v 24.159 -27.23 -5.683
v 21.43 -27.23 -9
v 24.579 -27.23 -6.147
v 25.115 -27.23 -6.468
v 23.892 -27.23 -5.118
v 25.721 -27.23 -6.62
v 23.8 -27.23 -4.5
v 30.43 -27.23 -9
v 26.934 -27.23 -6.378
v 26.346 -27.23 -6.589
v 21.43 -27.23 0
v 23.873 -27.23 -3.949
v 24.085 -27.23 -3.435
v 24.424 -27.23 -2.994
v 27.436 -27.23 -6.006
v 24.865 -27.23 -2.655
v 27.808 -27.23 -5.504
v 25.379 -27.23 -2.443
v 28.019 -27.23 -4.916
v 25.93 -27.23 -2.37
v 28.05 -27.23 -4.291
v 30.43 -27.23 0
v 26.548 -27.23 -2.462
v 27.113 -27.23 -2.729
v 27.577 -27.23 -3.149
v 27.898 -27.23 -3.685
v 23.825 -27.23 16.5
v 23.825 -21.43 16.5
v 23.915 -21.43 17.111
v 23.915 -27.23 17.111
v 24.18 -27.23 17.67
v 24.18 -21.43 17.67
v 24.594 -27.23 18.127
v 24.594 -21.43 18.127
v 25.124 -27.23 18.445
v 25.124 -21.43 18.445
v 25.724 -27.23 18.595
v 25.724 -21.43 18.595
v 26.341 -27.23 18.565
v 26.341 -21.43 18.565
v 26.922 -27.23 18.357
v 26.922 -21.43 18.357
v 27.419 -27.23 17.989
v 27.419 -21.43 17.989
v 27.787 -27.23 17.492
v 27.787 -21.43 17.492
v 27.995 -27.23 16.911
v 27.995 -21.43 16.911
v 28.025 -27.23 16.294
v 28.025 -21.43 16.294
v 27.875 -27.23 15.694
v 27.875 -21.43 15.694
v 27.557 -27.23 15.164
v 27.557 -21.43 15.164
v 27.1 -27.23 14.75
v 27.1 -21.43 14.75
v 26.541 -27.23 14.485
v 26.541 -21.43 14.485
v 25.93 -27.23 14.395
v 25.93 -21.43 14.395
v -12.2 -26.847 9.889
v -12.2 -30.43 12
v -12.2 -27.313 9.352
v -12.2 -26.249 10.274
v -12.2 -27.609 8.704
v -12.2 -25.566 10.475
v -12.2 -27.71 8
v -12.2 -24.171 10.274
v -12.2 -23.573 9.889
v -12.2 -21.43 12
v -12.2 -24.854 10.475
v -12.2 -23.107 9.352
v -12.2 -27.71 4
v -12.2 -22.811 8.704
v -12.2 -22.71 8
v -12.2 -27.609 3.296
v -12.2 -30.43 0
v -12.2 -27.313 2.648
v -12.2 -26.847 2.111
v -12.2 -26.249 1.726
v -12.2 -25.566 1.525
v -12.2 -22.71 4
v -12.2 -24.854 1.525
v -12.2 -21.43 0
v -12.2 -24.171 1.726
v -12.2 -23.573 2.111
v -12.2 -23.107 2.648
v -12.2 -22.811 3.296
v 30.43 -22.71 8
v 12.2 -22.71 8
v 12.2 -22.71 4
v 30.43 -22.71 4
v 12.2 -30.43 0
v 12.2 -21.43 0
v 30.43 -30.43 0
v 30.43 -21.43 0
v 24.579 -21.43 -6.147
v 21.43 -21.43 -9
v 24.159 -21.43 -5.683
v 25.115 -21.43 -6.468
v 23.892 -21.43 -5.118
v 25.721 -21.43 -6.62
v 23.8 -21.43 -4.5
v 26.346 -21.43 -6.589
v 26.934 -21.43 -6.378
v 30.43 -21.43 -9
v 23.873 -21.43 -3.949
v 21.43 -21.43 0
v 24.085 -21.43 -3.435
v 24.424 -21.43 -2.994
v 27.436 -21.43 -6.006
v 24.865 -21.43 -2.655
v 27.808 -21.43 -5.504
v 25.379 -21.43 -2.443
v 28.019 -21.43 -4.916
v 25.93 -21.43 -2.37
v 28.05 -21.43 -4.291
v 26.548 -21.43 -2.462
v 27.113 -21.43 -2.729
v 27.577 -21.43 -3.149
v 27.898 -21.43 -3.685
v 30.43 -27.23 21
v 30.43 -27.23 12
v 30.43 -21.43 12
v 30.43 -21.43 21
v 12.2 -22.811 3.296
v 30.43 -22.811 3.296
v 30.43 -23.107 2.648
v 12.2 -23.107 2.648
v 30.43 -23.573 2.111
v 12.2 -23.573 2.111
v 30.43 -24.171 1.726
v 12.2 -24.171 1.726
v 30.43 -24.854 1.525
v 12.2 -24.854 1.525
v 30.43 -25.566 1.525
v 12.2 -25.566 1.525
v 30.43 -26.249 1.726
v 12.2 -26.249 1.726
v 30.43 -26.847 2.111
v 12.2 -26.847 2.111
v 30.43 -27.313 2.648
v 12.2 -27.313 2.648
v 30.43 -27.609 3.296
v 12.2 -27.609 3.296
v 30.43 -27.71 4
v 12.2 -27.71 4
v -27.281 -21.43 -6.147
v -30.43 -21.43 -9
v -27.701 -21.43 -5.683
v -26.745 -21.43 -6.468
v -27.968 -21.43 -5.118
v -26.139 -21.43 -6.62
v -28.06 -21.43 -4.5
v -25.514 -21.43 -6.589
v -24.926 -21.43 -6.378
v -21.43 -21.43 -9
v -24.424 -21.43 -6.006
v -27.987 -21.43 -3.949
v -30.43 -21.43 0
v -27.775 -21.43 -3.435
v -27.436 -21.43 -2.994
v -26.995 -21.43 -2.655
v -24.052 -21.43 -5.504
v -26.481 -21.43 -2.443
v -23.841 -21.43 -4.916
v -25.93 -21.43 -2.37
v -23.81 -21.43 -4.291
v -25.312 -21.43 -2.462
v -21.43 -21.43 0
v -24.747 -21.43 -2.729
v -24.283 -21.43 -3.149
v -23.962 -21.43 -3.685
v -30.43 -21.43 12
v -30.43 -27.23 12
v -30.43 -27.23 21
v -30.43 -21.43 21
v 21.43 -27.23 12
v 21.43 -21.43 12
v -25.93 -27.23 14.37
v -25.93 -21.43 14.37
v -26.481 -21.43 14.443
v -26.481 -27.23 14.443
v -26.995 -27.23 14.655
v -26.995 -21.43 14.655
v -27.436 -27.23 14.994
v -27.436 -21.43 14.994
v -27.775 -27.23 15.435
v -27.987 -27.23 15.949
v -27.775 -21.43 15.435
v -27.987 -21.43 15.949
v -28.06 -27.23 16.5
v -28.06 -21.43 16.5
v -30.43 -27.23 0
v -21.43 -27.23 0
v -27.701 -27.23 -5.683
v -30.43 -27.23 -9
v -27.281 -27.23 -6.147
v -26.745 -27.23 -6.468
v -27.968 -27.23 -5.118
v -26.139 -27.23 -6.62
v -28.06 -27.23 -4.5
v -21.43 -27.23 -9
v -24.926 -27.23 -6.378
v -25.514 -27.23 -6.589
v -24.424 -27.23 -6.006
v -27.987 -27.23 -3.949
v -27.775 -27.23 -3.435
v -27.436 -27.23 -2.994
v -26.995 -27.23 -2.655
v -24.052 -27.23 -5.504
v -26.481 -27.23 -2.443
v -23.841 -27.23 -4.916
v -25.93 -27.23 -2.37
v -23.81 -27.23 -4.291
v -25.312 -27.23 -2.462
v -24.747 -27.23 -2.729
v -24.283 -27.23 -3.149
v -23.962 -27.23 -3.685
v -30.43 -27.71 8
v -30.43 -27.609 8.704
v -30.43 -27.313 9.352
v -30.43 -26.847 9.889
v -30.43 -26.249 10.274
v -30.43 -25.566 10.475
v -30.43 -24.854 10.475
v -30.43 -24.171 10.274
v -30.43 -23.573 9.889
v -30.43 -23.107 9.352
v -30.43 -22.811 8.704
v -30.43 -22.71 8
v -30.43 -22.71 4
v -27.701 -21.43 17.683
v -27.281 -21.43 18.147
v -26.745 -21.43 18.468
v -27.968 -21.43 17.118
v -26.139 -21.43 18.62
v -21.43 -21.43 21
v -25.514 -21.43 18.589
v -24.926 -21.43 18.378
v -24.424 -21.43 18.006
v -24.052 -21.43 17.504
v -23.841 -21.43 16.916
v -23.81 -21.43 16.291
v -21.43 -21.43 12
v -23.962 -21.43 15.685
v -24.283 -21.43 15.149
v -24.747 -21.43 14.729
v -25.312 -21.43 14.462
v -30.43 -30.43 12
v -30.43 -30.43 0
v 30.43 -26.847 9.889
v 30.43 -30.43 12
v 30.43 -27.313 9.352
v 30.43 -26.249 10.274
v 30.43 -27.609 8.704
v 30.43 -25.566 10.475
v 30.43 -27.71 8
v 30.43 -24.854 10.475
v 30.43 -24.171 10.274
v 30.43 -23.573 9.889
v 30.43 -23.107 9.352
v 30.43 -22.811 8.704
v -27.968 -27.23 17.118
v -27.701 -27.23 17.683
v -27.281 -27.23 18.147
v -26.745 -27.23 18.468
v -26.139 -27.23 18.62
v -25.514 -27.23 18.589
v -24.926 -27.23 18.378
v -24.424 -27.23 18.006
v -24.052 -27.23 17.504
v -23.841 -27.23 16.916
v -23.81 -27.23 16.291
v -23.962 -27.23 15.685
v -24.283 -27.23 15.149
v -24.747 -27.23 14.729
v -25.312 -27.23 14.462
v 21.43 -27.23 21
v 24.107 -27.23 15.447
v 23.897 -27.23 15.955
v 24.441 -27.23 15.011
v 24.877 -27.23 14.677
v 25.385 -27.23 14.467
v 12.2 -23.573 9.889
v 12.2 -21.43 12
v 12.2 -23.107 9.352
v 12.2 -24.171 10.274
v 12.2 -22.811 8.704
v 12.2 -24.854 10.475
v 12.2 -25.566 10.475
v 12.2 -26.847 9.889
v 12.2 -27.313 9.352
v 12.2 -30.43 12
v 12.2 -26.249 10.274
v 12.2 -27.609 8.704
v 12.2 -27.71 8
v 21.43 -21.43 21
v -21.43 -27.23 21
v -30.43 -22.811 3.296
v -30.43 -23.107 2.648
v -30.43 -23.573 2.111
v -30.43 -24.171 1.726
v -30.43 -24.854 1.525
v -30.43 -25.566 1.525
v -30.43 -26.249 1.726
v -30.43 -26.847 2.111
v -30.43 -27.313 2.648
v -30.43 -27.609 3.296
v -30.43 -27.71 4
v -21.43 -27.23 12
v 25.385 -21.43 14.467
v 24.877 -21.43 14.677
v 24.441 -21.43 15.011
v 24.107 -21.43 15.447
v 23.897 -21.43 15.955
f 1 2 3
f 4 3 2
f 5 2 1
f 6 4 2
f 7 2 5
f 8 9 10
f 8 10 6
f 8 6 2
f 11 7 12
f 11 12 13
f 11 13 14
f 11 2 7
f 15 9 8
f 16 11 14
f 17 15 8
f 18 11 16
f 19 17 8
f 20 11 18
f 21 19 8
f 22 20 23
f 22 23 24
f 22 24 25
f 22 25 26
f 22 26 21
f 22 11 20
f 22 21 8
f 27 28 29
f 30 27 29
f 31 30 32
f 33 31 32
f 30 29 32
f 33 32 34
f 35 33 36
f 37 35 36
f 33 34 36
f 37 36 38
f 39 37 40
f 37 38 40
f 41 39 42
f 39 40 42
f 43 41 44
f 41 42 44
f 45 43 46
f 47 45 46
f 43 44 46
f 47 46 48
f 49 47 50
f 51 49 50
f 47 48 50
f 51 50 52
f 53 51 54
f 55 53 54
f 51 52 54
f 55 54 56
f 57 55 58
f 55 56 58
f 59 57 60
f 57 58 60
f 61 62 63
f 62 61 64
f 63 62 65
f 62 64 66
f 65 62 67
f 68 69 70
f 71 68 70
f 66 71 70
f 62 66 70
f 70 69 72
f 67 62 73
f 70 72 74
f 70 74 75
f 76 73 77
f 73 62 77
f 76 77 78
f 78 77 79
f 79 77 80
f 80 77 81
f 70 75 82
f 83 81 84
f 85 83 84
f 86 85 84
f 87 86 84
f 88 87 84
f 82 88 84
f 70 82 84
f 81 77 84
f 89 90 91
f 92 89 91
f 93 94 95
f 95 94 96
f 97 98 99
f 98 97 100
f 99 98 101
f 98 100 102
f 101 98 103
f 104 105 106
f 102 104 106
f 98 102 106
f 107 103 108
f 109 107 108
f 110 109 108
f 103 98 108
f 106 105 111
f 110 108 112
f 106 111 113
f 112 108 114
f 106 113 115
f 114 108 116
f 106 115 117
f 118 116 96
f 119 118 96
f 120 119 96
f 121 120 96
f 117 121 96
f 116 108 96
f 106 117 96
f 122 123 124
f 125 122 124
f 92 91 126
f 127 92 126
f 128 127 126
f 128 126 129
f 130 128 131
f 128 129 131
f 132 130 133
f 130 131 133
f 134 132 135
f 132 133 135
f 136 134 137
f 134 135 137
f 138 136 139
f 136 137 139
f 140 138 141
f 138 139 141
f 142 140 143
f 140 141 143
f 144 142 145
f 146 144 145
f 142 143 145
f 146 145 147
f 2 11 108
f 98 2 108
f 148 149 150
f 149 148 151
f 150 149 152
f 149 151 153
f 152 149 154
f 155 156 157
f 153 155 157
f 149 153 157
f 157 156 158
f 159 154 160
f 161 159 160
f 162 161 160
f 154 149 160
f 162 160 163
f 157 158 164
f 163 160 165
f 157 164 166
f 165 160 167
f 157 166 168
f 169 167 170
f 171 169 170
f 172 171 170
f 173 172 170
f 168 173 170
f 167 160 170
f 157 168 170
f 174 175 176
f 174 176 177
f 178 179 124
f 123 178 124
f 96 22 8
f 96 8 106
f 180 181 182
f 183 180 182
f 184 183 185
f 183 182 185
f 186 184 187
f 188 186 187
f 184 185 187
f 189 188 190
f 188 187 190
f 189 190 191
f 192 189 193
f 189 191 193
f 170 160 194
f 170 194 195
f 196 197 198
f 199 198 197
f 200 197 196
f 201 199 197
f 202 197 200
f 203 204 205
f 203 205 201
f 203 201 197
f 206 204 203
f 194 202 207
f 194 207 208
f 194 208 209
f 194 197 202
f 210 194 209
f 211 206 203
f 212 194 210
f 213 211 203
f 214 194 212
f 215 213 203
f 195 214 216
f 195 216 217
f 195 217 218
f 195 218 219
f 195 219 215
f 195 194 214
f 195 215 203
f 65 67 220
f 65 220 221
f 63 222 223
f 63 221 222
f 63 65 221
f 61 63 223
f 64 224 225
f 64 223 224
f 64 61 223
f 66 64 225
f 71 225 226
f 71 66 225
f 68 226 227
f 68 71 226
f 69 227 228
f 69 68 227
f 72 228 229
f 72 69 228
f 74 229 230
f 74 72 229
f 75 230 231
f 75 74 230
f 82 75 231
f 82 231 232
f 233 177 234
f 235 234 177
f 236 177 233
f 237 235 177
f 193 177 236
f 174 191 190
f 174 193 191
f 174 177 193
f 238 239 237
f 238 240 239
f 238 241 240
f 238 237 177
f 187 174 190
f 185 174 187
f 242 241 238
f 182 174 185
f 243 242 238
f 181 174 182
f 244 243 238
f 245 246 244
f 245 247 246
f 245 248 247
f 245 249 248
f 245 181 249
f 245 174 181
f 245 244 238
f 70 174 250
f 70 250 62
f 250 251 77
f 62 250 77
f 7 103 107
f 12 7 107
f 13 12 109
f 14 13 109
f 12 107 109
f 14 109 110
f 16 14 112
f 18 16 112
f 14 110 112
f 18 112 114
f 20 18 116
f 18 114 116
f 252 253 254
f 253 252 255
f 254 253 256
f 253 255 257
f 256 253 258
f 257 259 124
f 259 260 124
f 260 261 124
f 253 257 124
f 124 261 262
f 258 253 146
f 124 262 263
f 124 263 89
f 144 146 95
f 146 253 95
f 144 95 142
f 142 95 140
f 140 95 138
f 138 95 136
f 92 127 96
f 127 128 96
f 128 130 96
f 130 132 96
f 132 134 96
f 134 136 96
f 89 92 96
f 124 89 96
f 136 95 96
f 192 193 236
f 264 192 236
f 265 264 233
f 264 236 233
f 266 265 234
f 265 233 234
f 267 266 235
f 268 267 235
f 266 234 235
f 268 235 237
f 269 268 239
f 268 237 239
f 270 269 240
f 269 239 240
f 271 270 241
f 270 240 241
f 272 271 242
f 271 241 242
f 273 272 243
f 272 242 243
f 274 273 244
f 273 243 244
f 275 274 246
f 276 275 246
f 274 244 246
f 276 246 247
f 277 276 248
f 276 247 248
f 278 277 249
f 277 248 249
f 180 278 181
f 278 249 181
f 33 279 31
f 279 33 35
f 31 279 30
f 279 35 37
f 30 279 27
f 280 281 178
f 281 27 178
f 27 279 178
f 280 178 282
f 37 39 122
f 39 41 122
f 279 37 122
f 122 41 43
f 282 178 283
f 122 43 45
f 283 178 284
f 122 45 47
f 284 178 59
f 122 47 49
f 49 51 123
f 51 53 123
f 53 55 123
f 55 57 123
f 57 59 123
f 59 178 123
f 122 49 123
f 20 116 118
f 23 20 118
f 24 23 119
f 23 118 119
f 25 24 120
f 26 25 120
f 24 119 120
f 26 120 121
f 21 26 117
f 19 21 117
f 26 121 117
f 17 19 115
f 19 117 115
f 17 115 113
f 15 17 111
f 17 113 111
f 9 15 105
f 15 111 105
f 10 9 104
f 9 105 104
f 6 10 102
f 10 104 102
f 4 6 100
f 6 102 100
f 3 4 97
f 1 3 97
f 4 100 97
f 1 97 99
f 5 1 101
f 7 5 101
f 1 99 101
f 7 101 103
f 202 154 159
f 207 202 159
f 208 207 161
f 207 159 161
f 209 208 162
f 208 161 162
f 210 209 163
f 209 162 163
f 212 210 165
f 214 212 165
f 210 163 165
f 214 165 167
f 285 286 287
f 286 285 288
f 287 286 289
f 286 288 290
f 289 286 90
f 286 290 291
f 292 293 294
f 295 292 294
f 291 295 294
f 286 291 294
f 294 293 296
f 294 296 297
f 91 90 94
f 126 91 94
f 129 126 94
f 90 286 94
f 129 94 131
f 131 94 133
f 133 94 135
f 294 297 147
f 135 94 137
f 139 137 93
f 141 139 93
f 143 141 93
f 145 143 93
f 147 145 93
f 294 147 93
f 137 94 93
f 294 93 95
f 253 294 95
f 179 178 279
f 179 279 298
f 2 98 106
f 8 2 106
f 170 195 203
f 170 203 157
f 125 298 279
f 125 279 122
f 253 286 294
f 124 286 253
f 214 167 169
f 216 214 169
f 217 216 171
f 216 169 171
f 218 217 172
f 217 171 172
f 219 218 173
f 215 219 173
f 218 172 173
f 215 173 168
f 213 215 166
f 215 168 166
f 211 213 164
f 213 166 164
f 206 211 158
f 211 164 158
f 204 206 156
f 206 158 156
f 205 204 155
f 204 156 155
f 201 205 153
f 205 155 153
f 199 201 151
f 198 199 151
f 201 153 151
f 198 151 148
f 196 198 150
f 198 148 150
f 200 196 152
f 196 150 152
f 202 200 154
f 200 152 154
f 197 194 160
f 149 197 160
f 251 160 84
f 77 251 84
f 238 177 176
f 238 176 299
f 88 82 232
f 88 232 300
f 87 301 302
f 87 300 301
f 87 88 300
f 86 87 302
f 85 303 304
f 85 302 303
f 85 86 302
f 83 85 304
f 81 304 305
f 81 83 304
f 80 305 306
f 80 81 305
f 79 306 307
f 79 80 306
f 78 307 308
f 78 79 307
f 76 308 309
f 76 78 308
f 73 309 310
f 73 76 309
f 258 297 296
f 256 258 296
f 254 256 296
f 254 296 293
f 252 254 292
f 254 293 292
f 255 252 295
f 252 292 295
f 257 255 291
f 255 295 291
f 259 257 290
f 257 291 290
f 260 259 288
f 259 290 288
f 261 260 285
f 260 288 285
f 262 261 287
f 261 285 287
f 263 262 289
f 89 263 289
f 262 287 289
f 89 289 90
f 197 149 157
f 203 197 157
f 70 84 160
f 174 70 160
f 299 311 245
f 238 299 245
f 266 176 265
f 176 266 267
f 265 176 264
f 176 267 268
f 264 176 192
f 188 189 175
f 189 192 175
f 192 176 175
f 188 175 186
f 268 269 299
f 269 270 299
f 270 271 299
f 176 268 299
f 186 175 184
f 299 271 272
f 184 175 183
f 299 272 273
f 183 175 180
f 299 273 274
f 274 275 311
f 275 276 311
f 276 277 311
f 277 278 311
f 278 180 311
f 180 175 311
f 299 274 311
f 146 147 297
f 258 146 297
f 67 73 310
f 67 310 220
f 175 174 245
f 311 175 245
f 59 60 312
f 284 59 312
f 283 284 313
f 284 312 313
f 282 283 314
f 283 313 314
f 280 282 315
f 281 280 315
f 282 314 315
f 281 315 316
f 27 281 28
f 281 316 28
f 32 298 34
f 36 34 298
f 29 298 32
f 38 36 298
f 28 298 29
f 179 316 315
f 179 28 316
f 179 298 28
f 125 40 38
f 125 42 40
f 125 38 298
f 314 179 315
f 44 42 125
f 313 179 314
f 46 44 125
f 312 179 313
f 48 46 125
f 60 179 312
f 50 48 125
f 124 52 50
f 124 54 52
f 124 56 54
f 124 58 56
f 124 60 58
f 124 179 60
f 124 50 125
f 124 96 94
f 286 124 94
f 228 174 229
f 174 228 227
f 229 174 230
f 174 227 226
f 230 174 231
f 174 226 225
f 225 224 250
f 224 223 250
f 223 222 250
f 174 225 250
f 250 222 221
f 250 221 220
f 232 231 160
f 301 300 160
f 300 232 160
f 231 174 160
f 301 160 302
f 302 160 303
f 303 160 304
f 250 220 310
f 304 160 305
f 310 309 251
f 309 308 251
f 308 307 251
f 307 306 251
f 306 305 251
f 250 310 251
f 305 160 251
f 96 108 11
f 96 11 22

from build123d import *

# Parameters (mm, degrees)
F0_W      = 9
F0_H      = 5.8
F0_H_2    = 3.2
F1_DEPTH  = 12
F5_DEPTH  = 9
F3_W      = 9
F3_H      = 5.8
F6_DEPTH  = 9
F4_W      = 9
F4_H      = 5.8
F8_DEPTH  = 25
F10_DEPTH = 25
F12_DEPTH = 25
F14_DEPTH = 25
F15_DEPTH = 25
F16_DEPTH = 59


with BuildPart() as f1:
    # F0 (on Top) → F1 (new body)
    with BuildSketch(Plane.XY):
        Polygon((-12.2, -21.43), (-21.43, -21.43), (-21.43, -27.23), (-21.43, -30.43), (-12.2, -30.43), align=None)
        with Locations((-25.93, -24.33)):
            Rectangle(F0_W, F0_H)
        with Locations((-25.93, -28.83)):
            Rectangle(F0_W, F0_H_2)
    extrude(amount=F1_DEPTH)

    # F2 (on face) → F16 (cut)
    with BuildSketch(Plane(origin=(12.2, 0, 0), x_dir=(0, -1, 0), z_dir=(-1, 0, 0))):
        with BuildLine():
            ThreePointArc((27.71, 8), (25.21, 10.5), (22.71, 8))
            Line((22.71, 8), (25.21, 8))
            Line((25.21, 8), (27.71, 8))
        make_face()
        with BuildLine():
            ThreePointArc((22.71, 8), (22.9739320225, 6.8819660113), (23.71, 6))
            ThreePointArc((23.71, 6), (25.21, 6.5), (26.71, 6))
            ThreePointArc((26.71, 6), (27.4460679775, 6.8819660113), (27.71, 8))
            Line((27.71, 8), (25.21, 8))
            Line((25.21, 8), (22.71, 8))
        make_face()
        with BuildLine():
            ThreePointArc((26.71, 6), (25.21, 6.5), (23.71, 6))
            ThreePointArc((23.71, 6), (25.21, 5.5), (26.71, 6))
        make_face()
        with BuildLine():
            ThreePointArc((26.71, 6), (25.21, 5.5), (23.71, 6))
            ThreePointArc((23.71, 6), (22.9739320225, 5.1180339887), (22.71, 4))
            Line((22.71, 4), (27.71, 4))
            ThreePointArc((27.71, 4), (27.4460679775, 5.1180339887), (26.71, 6))
        make_face()
        with BuildLine():
            Line((22.71, 8), (22.71, 6))
            Line((22.71, 6), (23.71, 6))
            ThreePointArc((23.71, 6), (22.9739320225, 6.8819660113), (22.71, 8))
        make_face()
        with BuildLine():
            Line((23.71, 6), (22.71, 6))
            Line((22.71, 6), (22.71, 4))
            ThreePointArc((22.71, 4), (22.9739320225, 5.1180339887), (23.71, 6))
        make_face()
        with BuildLine():
            ThreePointArc((27.71, 8), (27.4460679775, 6.8819660113), (26.71, 6))
            ThreePointArc((26.71, 6), (27.4460679775, 5.1180339887), (27.71, 4))
            Line((27.71, 4), (27.71, 6))
            Line((27.71, 6), (27.71, 8))
        make_face()
        with BuildLine():
            Line((27.71, 4), (22.71, 4))
            ThreePointArc((22.71, 4), (25.21, 1.5), (27.71, 4))
        make_face()
    extrude(amount=F16_DEPTH, mode=Mode.SUBTRACT)


with BuildPart() as f1b:
    # F0 (on Top) → F1, piece 2 (new body)
    with BuildSketch(Plane.XY):
        Polygon((21.43, -27.23), (21.43, -21.43), (12.2, -21.43), (12.2, -30.43), (21.43, -30.43), align=None)
        with Locations((25.93, -24.33)):
            Rectangle(F0_W, F0_H)
        with Locations((25.93, -28.83)):
            Rectangle(F0_W, F0_H_2)
    extrude(amount=F1_DEPTH)

    # F2 (on face) → F15 (cut)
    with BuildSketch(Plane(origin=(12.2, 0, 0), x_dir=(0, -1, 0), z_dir=(-1, 0, 0))):
        with BuildLine():
            ThreePointArc((27.71, 8), (25.21, 10.5), (22.71, 8))
            Line((22.71, 8), (25.21, 8))
            Line((25.21, 8), (27.71, 8))
        make_face()
        with BuildLine():
            ThreePointArc((22.71, 8), (22.9739320225, 6.8819660113), (23.71, 6))
            ThreePointArc((23.71, 6), (25.21, 6.5), (26.71, 6))
            ThreePointArc((26.71, 6), (27.4460679775, 6.8819660113), (27.71, 8))
            Line((27.71, 8), (25.21, 8))
            Line((25.21, 8), (22.71, 8))
        make_face()
        with BuildLine():
            ThreePointArc((26.71, 6), (25.21, 6.5), (23.71, 6))
            ThreePointArc((23.71, 6), (25.21, 5.5), (26.71, 6))
        make_face()
        with BuildLine():
            Line((22.71, 8), (22.71, 6))
            Line((22.71, 6), (23.71, 6))
            ThreePointArc((23.71, 6), (22.9739320225, 6.8819660113), (22.71, 8))
        make_face()
        with BuildLine():
            Line((23.71, 6), (22.71, 6))
            Line((22.71, 6), (22.71, 4))
            ThreePointArc((22.71, 4), (22.9739320225, 5.1180339887), (23.71, 6))
        make_face()
        with BuildLine():
            ThreePointArc((26.71, 6), (25.21, 5.5), (23.71, 6))
            ThreePointArc((23.71, 6), (22.9739320225, 5.1180339887), (22.71, 4))
            Line((22.71, 4), (27.71, 4))
            ThreePointArc((27.71, 4), (27.4460679775, 5.1180339887), (26.71, 6))
        make_face()
        with BuildLine():
            ThreePointArc((27.71, 8), (27.4460679775, 6.8819660113), (26.71, 6))
            ThreePointArc((26.71, 6), (27.4460679775, 5.1180339887), (27.71, 4))
            Line((27.71, 4), (27.71, 6))
            Line((27.71, 6), (27.71, 8))
        make_face()
        with BuildLine():
            Line((27.71, 4), (22.71, 4))
            ThreePointArc((22.71, 4), (25.21, 1.5), (27.71, 4))
        make_face()
    extrude(amount=-F15_DEPTH, mode=Mode.SUBTRACT)


with BuildPart() as f5:
    # F0 (on Top) → F5 (new body)
    with BuildSketch(Plane.XY):
        with Locations((25.93, -24.33)):
            Rectangle(F0_W, F0_H)
    extrude(amount=-F5_DEPTH)

    # F13 (on face) → F14 (cut)
    with BuildSketch(Plane(origin=(0, -21.43, 0), x_dir=(-1, 0, 0), z_dir=(0, 1, 0))):
        with BuildLine():
            ThreePointArc((-23.8, -4.5), (-24.4238625561, -2.9938625561), (-25.93, -2.37))
            ThreePointArc((-25.93, -2.37), (-27.4361374439, -6.0061374439), (-23.8, -4.5))
        make_face()
    extrude(amount=-F14_DEPTH, mode=Mode.SUBTRACT)


with BuildPart() as f5b:
    # F0 (on Top) → F5, piece 2 (new body)
    with BuildSketch(Plane.XY):
        with Locations((-25.93, -24.33)):
            Rectangle(F0_W, F0_H)
    extrude(amount=-F5_DEPTH)

    # F9 (on face) → F10 (cut)
    with BuildSketch(Plane(origin=(0, -21.43, 0), x_dir=(-1, 0, 0), z_dir=(0, 1, 0))):
        with BuildLine():
            ThreePointArc((28.06, -4.5), (27.4361374439, -2.9938625561), (25.93, -2.37))
            ThreePointArc((25.93, -2.37), (24.4238625561, -6.0061374439), (28.06, -4.5))
        make_face()
    extrude(amount=-F10_DEPTH, mode=Mode.SUBTRACT)


with BuildPart() as f6:
    # F3 (on face) → F6 (new body)
    with BuildSketch(Plane.XY.offset(12)):
        with Locations((25.93, -24.33)):
            Rectangle(F3_W, F3_H)
    extrude(amount=F6_DEPTH)

    # F11 (on face) → F12 (cut)
    with BuildSketch(Plane(origin=(0, -21.43, 0), x_dir=(-1, 0, 0), z_dir=(0, 1, 0))):
        with BuildLine():
            ThreePointArc((-23.8247930351, 16.5), (-27.4186061207, 17.9886061207), (-25.93, 14.3947930351))
            ThreePointArc((-25.93, 14.3947930351), (-24.4413938793, 15.0113938793), (-23.8247930351, 16.5))
        make_face()
    extrude(amount=-F12_DEPTH, mode=Mode.SUBTRACT)


with BuildPart() as f6b:
    # F4 (on face) → F6, piece 2 (new body)
    with BuildSketch(Plane.XY.offset(12)):
        with Locations((-25.93, -24.33)):
            Rectangle(F4_W, F4_H)
    extrude(amount=F6_DEPTH)

    # F7 (on face) → F8 (cut)
    with BuildSketch(Plane(origin=(0, -21.43, 0), x_dir=(-1, 0, 0), z_dir=(0, 1, 0))):
        with BuildLine():
            ThreePointArc((28.06, 16.5), (24.4238625561, 18.0061374439), (25.93, 14.37))
            ThreePointArc((25.93, 14.37), (27.4361374439, 14.9938625561), (28.06, 16.5))
        make_face()
    extrude(amount=-F8_DEPTH, mode=Mode.SUBTRACT)


solid = Compound([f1.part, f1b.part, f5.part, f5b.part, f6.part, f6b.part])
